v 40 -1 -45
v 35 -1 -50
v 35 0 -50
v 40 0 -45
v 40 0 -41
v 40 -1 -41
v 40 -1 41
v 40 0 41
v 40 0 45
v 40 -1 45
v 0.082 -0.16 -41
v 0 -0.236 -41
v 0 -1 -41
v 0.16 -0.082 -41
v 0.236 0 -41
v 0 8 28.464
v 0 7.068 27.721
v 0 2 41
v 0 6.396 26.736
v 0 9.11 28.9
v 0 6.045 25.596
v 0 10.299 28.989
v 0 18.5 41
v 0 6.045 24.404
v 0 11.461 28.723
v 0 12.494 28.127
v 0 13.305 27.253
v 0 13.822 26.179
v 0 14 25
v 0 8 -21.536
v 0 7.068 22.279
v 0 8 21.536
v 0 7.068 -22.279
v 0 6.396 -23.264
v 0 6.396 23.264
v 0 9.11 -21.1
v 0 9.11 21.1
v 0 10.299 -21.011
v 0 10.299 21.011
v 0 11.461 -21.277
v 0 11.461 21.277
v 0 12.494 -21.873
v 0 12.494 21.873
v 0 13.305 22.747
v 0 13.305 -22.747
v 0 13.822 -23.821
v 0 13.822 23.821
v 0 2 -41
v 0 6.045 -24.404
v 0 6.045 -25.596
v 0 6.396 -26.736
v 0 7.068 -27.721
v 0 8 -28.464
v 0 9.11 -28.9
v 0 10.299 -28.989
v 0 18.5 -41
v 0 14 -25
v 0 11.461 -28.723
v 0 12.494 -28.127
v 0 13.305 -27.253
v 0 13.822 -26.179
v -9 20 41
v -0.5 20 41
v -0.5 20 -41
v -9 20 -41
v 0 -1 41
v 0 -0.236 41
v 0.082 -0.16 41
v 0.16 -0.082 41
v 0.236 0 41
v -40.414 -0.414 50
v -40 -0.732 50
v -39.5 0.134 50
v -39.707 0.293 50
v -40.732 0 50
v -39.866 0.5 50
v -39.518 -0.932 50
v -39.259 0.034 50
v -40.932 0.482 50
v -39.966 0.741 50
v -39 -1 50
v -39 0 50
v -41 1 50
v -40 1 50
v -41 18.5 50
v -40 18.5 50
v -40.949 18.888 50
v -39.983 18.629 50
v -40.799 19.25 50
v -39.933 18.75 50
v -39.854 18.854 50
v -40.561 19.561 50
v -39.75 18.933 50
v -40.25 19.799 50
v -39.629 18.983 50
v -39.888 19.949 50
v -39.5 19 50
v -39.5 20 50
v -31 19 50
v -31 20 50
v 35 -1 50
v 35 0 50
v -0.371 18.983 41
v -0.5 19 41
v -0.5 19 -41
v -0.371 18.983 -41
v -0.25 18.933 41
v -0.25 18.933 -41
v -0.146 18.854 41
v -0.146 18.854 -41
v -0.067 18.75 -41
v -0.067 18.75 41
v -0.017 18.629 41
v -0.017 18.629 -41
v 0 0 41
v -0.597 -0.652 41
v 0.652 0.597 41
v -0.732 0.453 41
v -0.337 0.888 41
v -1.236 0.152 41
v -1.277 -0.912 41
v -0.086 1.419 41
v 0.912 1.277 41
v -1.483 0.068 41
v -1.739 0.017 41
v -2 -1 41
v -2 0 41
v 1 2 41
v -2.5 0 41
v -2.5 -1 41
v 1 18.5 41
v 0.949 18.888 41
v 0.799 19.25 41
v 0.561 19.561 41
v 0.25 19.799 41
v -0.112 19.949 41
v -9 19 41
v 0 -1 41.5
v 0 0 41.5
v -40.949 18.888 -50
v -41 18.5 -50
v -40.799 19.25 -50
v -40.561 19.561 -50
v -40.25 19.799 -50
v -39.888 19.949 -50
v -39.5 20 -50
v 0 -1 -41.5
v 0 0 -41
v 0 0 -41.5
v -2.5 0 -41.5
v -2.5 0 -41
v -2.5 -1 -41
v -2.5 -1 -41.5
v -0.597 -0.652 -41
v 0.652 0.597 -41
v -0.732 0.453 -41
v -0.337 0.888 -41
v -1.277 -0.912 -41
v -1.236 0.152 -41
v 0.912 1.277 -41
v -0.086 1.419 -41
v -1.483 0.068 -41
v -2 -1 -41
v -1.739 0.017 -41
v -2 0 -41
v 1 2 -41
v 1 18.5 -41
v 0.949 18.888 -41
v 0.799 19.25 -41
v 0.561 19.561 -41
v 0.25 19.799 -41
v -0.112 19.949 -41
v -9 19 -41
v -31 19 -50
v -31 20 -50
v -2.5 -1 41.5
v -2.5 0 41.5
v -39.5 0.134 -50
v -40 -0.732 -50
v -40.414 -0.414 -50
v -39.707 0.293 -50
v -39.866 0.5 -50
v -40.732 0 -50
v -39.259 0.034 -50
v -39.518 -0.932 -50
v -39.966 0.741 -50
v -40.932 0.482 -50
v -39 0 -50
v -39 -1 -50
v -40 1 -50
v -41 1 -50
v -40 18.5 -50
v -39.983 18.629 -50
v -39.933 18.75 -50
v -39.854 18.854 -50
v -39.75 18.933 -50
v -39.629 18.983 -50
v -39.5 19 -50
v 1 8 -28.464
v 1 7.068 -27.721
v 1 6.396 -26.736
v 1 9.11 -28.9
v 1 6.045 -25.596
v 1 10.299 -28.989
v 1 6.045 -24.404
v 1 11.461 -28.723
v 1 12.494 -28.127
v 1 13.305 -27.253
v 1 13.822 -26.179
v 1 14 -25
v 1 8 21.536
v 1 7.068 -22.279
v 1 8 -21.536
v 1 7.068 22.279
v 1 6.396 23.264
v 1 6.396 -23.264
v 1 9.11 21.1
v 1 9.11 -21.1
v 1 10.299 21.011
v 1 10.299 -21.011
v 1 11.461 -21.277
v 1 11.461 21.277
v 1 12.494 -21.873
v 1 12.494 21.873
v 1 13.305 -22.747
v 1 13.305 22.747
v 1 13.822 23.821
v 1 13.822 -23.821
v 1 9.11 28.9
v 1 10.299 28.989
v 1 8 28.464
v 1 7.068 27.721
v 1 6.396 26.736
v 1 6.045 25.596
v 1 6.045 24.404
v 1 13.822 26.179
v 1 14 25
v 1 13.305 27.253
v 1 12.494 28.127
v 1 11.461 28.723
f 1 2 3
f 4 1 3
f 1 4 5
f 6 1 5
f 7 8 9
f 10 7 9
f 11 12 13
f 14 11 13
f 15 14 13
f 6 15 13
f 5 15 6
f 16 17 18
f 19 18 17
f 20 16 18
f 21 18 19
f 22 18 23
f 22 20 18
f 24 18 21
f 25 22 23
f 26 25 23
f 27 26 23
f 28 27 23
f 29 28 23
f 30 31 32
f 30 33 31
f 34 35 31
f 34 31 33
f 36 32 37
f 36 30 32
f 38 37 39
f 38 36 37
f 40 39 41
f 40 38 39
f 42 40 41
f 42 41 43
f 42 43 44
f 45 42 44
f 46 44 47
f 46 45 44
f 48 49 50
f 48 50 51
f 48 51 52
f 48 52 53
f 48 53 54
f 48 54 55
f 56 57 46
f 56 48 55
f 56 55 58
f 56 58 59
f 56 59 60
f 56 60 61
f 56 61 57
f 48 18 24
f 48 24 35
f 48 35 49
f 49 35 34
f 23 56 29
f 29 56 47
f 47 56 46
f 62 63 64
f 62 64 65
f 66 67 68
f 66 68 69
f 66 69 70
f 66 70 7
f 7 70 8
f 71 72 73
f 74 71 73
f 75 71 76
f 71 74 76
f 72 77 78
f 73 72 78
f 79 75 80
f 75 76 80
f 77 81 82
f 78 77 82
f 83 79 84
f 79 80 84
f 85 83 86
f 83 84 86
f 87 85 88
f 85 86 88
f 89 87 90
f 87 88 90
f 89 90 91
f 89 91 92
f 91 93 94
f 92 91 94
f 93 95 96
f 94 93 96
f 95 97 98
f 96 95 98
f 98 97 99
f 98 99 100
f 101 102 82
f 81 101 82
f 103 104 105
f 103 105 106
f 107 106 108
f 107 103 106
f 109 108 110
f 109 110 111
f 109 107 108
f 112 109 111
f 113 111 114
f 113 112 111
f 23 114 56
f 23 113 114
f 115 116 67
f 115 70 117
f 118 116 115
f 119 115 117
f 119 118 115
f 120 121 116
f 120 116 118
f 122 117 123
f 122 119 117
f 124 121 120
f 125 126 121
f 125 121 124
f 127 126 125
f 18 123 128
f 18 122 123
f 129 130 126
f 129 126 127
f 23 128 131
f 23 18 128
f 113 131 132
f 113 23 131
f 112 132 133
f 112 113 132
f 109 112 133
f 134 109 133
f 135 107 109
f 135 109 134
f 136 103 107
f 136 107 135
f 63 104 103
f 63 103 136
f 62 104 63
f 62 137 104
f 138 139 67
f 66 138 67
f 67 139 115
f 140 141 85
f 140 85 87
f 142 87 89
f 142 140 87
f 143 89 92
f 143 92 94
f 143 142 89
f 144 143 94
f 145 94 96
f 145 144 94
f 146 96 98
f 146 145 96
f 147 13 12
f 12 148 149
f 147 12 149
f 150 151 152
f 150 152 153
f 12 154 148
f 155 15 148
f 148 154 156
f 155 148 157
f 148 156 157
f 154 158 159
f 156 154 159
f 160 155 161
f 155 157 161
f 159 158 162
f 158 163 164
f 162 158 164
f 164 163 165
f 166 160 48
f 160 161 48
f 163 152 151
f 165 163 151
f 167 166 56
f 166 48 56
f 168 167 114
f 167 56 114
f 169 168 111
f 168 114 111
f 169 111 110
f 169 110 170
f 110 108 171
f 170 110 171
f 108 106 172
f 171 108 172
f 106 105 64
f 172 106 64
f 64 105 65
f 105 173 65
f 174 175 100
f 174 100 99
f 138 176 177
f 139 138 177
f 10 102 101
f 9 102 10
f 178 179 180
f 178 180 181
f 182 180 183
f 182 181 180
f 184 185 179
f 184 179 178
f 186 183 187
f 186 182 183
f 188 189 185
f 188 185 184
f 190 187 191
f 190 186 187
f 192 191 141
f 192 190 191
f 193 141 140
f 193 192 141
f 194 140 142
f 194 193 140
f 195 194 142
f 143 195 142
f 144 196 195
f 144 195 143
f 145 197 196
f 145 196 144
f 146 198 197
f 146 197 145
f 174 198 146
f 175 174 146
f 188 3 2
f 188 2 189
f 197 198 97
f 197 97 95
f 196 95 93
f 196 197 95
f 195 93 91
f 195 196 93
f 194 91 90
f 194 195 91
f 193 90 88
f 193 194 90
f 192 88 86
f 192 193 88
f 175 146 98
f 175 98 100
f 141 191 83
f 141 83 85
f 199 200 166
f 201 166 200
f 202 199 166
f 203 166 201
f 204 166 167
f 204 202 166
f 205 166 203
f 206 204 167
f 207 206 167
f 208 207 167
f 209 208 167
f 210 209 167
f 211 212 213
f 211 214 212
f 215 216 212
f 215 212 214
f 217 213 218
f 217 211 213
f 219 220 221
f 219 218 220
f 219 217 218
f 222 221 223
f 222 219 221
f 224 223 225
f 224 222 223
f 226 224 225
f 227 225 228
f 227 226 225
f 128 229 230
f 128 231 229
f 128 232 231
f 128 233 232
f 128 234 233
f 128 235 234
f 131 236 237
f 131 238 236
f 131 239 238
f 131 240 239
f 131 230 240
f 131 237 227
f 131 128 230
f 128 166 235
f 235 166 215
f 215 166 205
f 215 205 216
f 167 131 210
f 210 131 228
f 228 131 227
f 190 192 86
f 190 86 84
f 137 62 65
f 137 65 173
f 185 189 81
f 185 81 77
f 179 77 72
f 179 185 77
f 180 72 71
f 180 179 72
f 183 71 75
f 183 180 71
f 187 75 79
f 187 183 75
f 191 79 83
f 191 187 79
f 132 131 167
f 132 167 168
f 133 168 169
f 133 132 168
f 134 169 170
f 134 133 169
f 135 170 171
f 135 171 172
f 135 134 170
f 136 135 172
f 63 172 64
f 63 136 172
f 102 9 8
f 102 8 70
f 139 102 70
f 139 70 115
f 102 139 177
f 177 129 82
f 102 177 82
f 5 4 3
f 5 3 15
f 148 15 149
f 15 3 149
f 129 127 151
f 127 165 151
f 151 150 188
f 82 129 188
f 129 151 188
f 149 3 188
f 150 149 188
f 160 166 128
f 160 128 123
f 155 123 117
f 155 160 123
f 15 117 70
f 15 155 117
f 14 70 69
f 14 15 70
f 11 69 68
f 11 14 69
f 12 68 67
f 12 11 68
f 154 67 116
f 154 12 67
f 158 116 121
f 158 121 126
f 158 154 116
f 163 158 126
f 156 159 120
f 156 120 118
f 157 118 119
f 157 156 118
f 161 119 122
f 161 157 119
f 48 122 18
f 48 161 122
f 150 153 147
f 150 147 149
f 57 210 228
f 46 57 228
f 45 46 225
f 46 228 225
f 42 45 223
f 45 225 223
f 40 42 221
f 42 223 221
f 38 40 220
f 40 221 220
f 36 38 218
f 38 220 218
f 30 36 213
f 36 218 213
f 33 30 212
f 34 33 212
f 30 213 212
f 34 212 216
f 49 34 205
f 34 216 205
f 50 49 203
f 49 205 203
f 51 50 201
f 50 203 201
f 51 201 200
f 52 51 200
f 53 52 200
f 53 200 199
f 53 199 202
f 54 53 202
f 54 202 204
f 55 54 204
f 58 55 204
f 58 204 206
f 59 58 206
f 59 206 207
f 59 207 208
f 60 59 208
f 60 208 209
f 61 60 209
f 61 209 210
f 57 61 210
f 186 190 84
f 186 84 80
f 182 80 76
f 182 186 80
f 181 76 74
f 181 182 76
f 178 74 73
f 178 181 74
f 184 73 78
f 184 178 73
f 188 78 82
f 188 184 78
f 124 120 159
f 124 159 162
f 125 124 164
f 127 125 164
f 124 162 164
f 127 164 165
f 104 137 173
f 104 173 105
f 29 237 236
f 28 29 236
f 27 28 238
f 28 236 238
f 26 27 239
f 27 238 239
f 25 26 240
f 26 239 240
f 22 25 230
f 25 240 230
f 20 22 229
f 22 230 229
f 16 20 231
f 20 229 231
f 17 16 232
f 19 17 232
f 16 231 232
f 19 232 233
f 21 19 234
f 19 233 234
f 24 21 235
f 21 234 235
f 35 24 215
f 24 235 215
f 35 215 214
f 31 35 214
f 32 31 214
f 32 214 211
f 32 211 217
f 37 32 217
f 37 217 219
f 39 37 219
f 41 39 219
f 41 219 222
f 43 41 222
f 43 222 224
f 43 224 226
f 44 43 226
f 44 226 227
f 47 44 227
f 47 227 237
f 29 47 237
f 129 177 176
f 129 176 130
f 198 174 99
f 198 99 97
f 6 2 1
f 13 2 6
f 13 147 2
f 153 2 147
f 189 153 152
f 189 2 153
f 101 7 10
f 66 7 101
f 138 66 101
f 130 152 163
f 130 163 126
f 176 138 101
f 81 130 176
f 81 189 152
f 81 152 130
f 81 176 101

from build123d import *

# Parameters (mm, degrees)
BASE_FLANGE1_DEPTH           = 1
BREAK_CORNER1_START          = 60.104076401
BREAK_CORNER1_OUTLINE_W      = 72.104076401
BREAK_CORNER1_OUTLINE_H      = 3
BREAK_CORNER1_DEPTH          = 3.535533906
BREAK_CORNER1_START_2        = -12
BREAK_CORNER1_2_OUTLINE_W    = 4.895923599
BREAK_CORNER1_2_OUTLINE_H    = 3
BREAK_CORNER1_2_DEPTH        = 11.292893219
EDGE_FLANGE1_STRIP_W         = 6
EDGE_FLANGE1_STRIP_H         = 1
EDGE_FLANGE1_STRIP_CUT_DEPTH = 100
EDGE_FLANGE1_DEPTH           = 100
EDGE_FLANGE2_STRIP_W         = 5
EDGE_FLANGE2_STRIP_H         = 1
EDGE_FLANGE2_STRIP_CUT_DEPTH = 100
EDGE_FLANGE2_DEPTH           = 100
EDGE_FLANGE3_START           = -2.5
EDGE_FLANGE3_OUTLINE_W       = 0.5
EDGE_FLANGE3_OUTLINE_H       = 1
EDGE_FLANGE3_DEPTH           = 2.5
EDGE_FLANGE3_START_2         = -1.23595
EDGE_FLANGE3_2_OUTLINE_W     = 19
EDGE_FLANGE3_2_OUTLINE_H     = 82
EDGE_FLANGE3_2_DEPTH         = 2.23595
EDGE_FLANGE3_3_OUTLINE_W     = 1
EDGE_FLANGE3_3_OUTLINE_H     = 82
EDGE_FLANGE3_3_DEPTH         = 0.70822
EDGE_FLANGE3_START_3         = -41
EDGE_FLANGE3_4_DEPTH         = 82
EDGE_FLANGE3_5_DEPTH         = 82
EDGE_FLANGE4_STRIP_W         = 5
EDGE_FLANGE4_STRIP_H         = 1
EDGE_FLANGE4_STRIP_CUT_DEPTH = 82
EDGE_FLANGE4_DEPTH           = 82
SKETCH18_R                   = 4
CUT_EXTRUDE1_DEPTH           = 10


with BuildPart() as part:
    # Base-Flange1: sheet metal written as solids
    # Sketch1 → Base-Flange1 (new body)
    with BuildSketch(Plane(origin=(0, 0, 0), x_dir=(1, 0, 0), z_dir=(0, 1, 0))):
        Polygon((39.172092849, 50), (40, 50), (40, 41), (0, 41), (0, -41), (40, -41), (40, -50), (-40, -50), (-40, 50), align=None)
    extrude(amount=-BASE_FLANGE1_DEPTH)

    # Break-Corner1: read off the stored shape, not the designer's step
    # Break-Corner1 outline → Break-Corner1 (cut)
    with BuildSketch(Plane(origin=(0, 0, 0), x_dir=(0.707106781186548, 0, -0.707106781186547), z_dir=(0.707106781186547, 0, 0.707106781186548)).offset(BREAK_CORNER1_START)):
        with Locations((24.052038201, -0.5)):
            Rectangle(BREAK_CORNER1_OUTLINE_W, BREAK_CORNER1_OUTLINE_H)
    extrude(amount=BREAK_CORNER1_DEPTH, mode=Mode.SUBTRACT)

    # Break-Corner1 2 outline → Break-Corner1 2 (cut)
    with BuildSketch(Plane(origin=(0, 0, 0), x_dir=(0.707106781186548, 0, -0.707106781186547), z_dir=(0.707106781186547, 0, 0.707106781186548)).offset(BREAK_CORNER1_START_2)):
        with Locations((62.552038201, -0.5)):
            Rectangle(BREAK_CORNER1_2_OUTLINE_W, BREAK_CORNER1_2_OUTLINE_H)
    extrude(amount=BREAK_CORNER1_2_DEPTH, mode=Mode.SUBTRACT)

    # Edge-Flange1: sheet metal written as solids
    # Edge-Flange1 strip (on a plane across the edge) → Edge-Flange1 strip cut (cut)
    with BuildSketch(Plane(origin=(-40, 0, -50), x_dir=(1, 0, 0), z_dir=(0, 0, 1))):
        with Locations((-2, -0.5)):
            Rectangle(EDGE_FLANGE1_STRIP_W, EDGE_FLANGE1_STRIP_H)
    extrude(amount=EDGE_FLANGE1_STRIP_CUT_DEPTH, mode=Mode.SUBTRACT)

    # Edge-Flange1 section (on a plane across the edge) → Edge-Flange1 (add)
    with BuildSketch(Plane(origin=(-40, 0, -50), x_dir=(1, 0, 0), z_dir=(0, 0, 1))):
        with BuildLine():
            Line((-1, 1), (-1, 19))
            Line((-1, 19), (0, 19))
            Line((0, 19), (0, 1))
            ThreePointArc((0, 1), (0.292893219, 0.292893219), (1, 0))
            Line((1, 0), (1, -1))
            ThreePointArc((1, -1), (-0.414213562, -0.414213562), (-1, 1))
        make_face()
    extrude(amount=EDGE_FLANGE1_DEPTH)

    # Edge-Flange2: sheet metal written as solids
    # Edge-Flange2 strip (on a plane across the edge) → Edge-Flange2 strip cut (cut)
    with BuildSketch(Plane(origin=(-40, 19, -50), x_dir=(0, -1, 0), z_dir=(0, 0, 1))):
        with Locations((-2, -0.5)):
            Rectangle(EDGE_FLANGE2_STRIP_W, EDGE_FLANGE2_STRIP_H)
    extrude(amount=EDGE_FLANGE2_STRIP_CUT_DEPTH, mode=Mode.SUBTRACT)

    # Edge-Flange2 section (on a plane across the edge) → Edge-Flange2 (add)
    with BuildSketch(Plane(origin=(-40, 19, -50), x_dir=(0, -1, 0), z_dir=(0, 0, 1))):
        with BuildLine():
            Line((-1, 0.5), (-1, 9))
            Line((-1, 9), (0, 9))
            Line((0, 9), (0, 0.5))
            ThreePointArc((0, 0.5), (0.146446609, 0.146446609), (0.5, 0))
            Line((0.5, 0), (0.5, -1))
            ThreePointArc((0.5, -1), (-0.560660172, -0.560660172), (-1, 0.5))
        make_face()
    extrude(amount=EDGE_FLANGE2_DEPTH)

    # Edge-Flange3: read off the stored shape, not the designer's step
    # Edge-Flange3 outline → Edge-Flange3 (cut)
    with BuildSketch(Plane(origin=(0, 0, 0), x_dir=(0, 0, -1), z_dir=(1, 0, 0)).offset(EDGE_FLANGE3_START)):
        with Locations((41.25, -0.5)):
            Rectangle(EDGE_FLANGE3_OUTLINE_W, EDGE_FLANGE3_OUTLINE_H)
        with Locations((-41.25, -0.5)):
            Rectangle(EDGE_FLANGE3_OUTLINE_W, EDGE_FLANGE3_OUTLINE_H)
    extrude(amount=EDGE_FLANGE3_DEPTH, mode=Mode.SUBTRACT)

    # Edge-Flange3 2 outline → Edge-Flange3 2 (add)
    with BuildSketch(Plane.YZ.offset(EDGE_FLANGE3_START_2)):
        with Locations((9.5, 0)):
            Rectangle(EDGE_FLANGE3_2_OUTLINE_W, EDGE_FLANGE3_2_OUTLINE_H)
    extrude(amount=EDGE_FLANGE3_2_DEPTH)

    # Edge-Flange3 3 outline → Edge-Flange3 3 (add)
    with BuildSketch(Plane.YZ):
        with Locations((-0.5, 0)):
            Rectangle(EDGE_FLANGE3_3_OUTLINE_W, EDGE_FLANGE3_3_OUTLINE_H)
    extrude(amount=EDGE_FLANGE3_3_DEPTH)

    # Edge-Flange3 4 outline → Edge-Flange3 4 (add)
    with BuildSketch(Plane.XY.offset(EDGE_FLANGE3_START_3)):
        with BuildLine():
            Line((-1.23595, -0.901073525), (-1.23595, 0.151696022))
            ThreePointArc((-1.23595, 0.151696022), (-1.610518266, 0.038290547), (-2, 0))
            Line((-2, 0), (-3, -1e-09))
            Line((-3, -1e-09), (-3, -0.999999999))
            Line((-3, -0.999999999), (-2, -1))
            ThreePointArc((-2, -1), (-1.614786147, -0.97516559), (-1.23595, -0.901073525))
        make_face()
    extrude(amount=EDGE_FLANGE3_4_DEPTH)

    # Edge-Flange3 5 outline → Edge-Flange3 5 (cut)
    with BuildSketch(Plane.XY.offset(EDGE_FLANGE3_START_3)):
        with BuildLine():
            Line((0, 2), (0, 19))
            Line((0, 19), (-1.23595, 19))
            Line((-1.23595, 19), (-1.23595, 0.151696022))
            ThreePointArc((-1.23595, 0.151696022), (-0.337456768, 0.888267119), (0, 2))
        make_face()
        with BuildLine():
            Line((1, 0), (1, 2))
            ThreePointArc((1, 2), (0.121320344, -0.121320344), (-2, -1))
            Line((-2, -1), (0.70822, -1))
            Line((0.70822, -1), (0.70822, 0))
            Line((0.70822, 0), (1, 0))
        make_face()
    extrude(amount=EDGE_FLANGE3_5_DEPTH, mode=Mode.SUBTRACT)

    # Edge-Flange4: sheet metal written as solids
    # Edge-Flange4 strip (on a plane across the edge) → Edge-Flange4 strip cut (cut)
    with BuildSketch(Plane(origin=(0, 19, 41), x_dir=(0, -1, 0), z_dir=(0, 0, -1))):
        with Locations((-2, -0.5)):
            Rectangle(EDGE_FLANGE4_STRIP_W, EDGE_FLANGE4_STRIP_H)
    extrude(amount=EDGE_FLANGE4_STRIP_CUT_DEPTH, mode=Mode.SUBTRACT)

    # Edge-Flange4 section (on a plane across the edge) → Edge-Flange4 (add)
    with BuildSketch(Plane(origin=(0, 19, 41), x_dir=(0, -1, 0), z_dir=(0, 0, -1))):
        with BuildLine():
            Line((-1, 0.5), (-1, 9))
            Line((-1, 9), (0, 9))
            Line((0, 9), (0, 0.5))
            ThreePointArc((0, 0.5), (0.146446609, 0.146446609), (0.5, 0))
            Line((0.5, 0), (0.5, -1))
            ThreePointArc((0.5, -1), (-0.560660172, -0.560660172), (-1, 0.5))
        make_face()
    extrude(amount=EDGE_FLANGE4_DEPTH)

    # Sketch18 → Cut-Extrude1 (cut)
    with BuildSketch(Plane(origin=(1, 0, 0), x_dir=(0, 0, -1), z_dir=(1, 0, 0))):
        with Locations(Location((-25, 10, 0), (0, 0, 90))):
            Circle(SKETCH18_R)
        with Locations(Location((25, 10, 0), (0, 0, 90))):
            Circle(SKETCH18_R)
    extrude(amount=-CUT_EXTRUDE1_DEPTH, mode=Mode.SUBTRACT)


solid = part.part
